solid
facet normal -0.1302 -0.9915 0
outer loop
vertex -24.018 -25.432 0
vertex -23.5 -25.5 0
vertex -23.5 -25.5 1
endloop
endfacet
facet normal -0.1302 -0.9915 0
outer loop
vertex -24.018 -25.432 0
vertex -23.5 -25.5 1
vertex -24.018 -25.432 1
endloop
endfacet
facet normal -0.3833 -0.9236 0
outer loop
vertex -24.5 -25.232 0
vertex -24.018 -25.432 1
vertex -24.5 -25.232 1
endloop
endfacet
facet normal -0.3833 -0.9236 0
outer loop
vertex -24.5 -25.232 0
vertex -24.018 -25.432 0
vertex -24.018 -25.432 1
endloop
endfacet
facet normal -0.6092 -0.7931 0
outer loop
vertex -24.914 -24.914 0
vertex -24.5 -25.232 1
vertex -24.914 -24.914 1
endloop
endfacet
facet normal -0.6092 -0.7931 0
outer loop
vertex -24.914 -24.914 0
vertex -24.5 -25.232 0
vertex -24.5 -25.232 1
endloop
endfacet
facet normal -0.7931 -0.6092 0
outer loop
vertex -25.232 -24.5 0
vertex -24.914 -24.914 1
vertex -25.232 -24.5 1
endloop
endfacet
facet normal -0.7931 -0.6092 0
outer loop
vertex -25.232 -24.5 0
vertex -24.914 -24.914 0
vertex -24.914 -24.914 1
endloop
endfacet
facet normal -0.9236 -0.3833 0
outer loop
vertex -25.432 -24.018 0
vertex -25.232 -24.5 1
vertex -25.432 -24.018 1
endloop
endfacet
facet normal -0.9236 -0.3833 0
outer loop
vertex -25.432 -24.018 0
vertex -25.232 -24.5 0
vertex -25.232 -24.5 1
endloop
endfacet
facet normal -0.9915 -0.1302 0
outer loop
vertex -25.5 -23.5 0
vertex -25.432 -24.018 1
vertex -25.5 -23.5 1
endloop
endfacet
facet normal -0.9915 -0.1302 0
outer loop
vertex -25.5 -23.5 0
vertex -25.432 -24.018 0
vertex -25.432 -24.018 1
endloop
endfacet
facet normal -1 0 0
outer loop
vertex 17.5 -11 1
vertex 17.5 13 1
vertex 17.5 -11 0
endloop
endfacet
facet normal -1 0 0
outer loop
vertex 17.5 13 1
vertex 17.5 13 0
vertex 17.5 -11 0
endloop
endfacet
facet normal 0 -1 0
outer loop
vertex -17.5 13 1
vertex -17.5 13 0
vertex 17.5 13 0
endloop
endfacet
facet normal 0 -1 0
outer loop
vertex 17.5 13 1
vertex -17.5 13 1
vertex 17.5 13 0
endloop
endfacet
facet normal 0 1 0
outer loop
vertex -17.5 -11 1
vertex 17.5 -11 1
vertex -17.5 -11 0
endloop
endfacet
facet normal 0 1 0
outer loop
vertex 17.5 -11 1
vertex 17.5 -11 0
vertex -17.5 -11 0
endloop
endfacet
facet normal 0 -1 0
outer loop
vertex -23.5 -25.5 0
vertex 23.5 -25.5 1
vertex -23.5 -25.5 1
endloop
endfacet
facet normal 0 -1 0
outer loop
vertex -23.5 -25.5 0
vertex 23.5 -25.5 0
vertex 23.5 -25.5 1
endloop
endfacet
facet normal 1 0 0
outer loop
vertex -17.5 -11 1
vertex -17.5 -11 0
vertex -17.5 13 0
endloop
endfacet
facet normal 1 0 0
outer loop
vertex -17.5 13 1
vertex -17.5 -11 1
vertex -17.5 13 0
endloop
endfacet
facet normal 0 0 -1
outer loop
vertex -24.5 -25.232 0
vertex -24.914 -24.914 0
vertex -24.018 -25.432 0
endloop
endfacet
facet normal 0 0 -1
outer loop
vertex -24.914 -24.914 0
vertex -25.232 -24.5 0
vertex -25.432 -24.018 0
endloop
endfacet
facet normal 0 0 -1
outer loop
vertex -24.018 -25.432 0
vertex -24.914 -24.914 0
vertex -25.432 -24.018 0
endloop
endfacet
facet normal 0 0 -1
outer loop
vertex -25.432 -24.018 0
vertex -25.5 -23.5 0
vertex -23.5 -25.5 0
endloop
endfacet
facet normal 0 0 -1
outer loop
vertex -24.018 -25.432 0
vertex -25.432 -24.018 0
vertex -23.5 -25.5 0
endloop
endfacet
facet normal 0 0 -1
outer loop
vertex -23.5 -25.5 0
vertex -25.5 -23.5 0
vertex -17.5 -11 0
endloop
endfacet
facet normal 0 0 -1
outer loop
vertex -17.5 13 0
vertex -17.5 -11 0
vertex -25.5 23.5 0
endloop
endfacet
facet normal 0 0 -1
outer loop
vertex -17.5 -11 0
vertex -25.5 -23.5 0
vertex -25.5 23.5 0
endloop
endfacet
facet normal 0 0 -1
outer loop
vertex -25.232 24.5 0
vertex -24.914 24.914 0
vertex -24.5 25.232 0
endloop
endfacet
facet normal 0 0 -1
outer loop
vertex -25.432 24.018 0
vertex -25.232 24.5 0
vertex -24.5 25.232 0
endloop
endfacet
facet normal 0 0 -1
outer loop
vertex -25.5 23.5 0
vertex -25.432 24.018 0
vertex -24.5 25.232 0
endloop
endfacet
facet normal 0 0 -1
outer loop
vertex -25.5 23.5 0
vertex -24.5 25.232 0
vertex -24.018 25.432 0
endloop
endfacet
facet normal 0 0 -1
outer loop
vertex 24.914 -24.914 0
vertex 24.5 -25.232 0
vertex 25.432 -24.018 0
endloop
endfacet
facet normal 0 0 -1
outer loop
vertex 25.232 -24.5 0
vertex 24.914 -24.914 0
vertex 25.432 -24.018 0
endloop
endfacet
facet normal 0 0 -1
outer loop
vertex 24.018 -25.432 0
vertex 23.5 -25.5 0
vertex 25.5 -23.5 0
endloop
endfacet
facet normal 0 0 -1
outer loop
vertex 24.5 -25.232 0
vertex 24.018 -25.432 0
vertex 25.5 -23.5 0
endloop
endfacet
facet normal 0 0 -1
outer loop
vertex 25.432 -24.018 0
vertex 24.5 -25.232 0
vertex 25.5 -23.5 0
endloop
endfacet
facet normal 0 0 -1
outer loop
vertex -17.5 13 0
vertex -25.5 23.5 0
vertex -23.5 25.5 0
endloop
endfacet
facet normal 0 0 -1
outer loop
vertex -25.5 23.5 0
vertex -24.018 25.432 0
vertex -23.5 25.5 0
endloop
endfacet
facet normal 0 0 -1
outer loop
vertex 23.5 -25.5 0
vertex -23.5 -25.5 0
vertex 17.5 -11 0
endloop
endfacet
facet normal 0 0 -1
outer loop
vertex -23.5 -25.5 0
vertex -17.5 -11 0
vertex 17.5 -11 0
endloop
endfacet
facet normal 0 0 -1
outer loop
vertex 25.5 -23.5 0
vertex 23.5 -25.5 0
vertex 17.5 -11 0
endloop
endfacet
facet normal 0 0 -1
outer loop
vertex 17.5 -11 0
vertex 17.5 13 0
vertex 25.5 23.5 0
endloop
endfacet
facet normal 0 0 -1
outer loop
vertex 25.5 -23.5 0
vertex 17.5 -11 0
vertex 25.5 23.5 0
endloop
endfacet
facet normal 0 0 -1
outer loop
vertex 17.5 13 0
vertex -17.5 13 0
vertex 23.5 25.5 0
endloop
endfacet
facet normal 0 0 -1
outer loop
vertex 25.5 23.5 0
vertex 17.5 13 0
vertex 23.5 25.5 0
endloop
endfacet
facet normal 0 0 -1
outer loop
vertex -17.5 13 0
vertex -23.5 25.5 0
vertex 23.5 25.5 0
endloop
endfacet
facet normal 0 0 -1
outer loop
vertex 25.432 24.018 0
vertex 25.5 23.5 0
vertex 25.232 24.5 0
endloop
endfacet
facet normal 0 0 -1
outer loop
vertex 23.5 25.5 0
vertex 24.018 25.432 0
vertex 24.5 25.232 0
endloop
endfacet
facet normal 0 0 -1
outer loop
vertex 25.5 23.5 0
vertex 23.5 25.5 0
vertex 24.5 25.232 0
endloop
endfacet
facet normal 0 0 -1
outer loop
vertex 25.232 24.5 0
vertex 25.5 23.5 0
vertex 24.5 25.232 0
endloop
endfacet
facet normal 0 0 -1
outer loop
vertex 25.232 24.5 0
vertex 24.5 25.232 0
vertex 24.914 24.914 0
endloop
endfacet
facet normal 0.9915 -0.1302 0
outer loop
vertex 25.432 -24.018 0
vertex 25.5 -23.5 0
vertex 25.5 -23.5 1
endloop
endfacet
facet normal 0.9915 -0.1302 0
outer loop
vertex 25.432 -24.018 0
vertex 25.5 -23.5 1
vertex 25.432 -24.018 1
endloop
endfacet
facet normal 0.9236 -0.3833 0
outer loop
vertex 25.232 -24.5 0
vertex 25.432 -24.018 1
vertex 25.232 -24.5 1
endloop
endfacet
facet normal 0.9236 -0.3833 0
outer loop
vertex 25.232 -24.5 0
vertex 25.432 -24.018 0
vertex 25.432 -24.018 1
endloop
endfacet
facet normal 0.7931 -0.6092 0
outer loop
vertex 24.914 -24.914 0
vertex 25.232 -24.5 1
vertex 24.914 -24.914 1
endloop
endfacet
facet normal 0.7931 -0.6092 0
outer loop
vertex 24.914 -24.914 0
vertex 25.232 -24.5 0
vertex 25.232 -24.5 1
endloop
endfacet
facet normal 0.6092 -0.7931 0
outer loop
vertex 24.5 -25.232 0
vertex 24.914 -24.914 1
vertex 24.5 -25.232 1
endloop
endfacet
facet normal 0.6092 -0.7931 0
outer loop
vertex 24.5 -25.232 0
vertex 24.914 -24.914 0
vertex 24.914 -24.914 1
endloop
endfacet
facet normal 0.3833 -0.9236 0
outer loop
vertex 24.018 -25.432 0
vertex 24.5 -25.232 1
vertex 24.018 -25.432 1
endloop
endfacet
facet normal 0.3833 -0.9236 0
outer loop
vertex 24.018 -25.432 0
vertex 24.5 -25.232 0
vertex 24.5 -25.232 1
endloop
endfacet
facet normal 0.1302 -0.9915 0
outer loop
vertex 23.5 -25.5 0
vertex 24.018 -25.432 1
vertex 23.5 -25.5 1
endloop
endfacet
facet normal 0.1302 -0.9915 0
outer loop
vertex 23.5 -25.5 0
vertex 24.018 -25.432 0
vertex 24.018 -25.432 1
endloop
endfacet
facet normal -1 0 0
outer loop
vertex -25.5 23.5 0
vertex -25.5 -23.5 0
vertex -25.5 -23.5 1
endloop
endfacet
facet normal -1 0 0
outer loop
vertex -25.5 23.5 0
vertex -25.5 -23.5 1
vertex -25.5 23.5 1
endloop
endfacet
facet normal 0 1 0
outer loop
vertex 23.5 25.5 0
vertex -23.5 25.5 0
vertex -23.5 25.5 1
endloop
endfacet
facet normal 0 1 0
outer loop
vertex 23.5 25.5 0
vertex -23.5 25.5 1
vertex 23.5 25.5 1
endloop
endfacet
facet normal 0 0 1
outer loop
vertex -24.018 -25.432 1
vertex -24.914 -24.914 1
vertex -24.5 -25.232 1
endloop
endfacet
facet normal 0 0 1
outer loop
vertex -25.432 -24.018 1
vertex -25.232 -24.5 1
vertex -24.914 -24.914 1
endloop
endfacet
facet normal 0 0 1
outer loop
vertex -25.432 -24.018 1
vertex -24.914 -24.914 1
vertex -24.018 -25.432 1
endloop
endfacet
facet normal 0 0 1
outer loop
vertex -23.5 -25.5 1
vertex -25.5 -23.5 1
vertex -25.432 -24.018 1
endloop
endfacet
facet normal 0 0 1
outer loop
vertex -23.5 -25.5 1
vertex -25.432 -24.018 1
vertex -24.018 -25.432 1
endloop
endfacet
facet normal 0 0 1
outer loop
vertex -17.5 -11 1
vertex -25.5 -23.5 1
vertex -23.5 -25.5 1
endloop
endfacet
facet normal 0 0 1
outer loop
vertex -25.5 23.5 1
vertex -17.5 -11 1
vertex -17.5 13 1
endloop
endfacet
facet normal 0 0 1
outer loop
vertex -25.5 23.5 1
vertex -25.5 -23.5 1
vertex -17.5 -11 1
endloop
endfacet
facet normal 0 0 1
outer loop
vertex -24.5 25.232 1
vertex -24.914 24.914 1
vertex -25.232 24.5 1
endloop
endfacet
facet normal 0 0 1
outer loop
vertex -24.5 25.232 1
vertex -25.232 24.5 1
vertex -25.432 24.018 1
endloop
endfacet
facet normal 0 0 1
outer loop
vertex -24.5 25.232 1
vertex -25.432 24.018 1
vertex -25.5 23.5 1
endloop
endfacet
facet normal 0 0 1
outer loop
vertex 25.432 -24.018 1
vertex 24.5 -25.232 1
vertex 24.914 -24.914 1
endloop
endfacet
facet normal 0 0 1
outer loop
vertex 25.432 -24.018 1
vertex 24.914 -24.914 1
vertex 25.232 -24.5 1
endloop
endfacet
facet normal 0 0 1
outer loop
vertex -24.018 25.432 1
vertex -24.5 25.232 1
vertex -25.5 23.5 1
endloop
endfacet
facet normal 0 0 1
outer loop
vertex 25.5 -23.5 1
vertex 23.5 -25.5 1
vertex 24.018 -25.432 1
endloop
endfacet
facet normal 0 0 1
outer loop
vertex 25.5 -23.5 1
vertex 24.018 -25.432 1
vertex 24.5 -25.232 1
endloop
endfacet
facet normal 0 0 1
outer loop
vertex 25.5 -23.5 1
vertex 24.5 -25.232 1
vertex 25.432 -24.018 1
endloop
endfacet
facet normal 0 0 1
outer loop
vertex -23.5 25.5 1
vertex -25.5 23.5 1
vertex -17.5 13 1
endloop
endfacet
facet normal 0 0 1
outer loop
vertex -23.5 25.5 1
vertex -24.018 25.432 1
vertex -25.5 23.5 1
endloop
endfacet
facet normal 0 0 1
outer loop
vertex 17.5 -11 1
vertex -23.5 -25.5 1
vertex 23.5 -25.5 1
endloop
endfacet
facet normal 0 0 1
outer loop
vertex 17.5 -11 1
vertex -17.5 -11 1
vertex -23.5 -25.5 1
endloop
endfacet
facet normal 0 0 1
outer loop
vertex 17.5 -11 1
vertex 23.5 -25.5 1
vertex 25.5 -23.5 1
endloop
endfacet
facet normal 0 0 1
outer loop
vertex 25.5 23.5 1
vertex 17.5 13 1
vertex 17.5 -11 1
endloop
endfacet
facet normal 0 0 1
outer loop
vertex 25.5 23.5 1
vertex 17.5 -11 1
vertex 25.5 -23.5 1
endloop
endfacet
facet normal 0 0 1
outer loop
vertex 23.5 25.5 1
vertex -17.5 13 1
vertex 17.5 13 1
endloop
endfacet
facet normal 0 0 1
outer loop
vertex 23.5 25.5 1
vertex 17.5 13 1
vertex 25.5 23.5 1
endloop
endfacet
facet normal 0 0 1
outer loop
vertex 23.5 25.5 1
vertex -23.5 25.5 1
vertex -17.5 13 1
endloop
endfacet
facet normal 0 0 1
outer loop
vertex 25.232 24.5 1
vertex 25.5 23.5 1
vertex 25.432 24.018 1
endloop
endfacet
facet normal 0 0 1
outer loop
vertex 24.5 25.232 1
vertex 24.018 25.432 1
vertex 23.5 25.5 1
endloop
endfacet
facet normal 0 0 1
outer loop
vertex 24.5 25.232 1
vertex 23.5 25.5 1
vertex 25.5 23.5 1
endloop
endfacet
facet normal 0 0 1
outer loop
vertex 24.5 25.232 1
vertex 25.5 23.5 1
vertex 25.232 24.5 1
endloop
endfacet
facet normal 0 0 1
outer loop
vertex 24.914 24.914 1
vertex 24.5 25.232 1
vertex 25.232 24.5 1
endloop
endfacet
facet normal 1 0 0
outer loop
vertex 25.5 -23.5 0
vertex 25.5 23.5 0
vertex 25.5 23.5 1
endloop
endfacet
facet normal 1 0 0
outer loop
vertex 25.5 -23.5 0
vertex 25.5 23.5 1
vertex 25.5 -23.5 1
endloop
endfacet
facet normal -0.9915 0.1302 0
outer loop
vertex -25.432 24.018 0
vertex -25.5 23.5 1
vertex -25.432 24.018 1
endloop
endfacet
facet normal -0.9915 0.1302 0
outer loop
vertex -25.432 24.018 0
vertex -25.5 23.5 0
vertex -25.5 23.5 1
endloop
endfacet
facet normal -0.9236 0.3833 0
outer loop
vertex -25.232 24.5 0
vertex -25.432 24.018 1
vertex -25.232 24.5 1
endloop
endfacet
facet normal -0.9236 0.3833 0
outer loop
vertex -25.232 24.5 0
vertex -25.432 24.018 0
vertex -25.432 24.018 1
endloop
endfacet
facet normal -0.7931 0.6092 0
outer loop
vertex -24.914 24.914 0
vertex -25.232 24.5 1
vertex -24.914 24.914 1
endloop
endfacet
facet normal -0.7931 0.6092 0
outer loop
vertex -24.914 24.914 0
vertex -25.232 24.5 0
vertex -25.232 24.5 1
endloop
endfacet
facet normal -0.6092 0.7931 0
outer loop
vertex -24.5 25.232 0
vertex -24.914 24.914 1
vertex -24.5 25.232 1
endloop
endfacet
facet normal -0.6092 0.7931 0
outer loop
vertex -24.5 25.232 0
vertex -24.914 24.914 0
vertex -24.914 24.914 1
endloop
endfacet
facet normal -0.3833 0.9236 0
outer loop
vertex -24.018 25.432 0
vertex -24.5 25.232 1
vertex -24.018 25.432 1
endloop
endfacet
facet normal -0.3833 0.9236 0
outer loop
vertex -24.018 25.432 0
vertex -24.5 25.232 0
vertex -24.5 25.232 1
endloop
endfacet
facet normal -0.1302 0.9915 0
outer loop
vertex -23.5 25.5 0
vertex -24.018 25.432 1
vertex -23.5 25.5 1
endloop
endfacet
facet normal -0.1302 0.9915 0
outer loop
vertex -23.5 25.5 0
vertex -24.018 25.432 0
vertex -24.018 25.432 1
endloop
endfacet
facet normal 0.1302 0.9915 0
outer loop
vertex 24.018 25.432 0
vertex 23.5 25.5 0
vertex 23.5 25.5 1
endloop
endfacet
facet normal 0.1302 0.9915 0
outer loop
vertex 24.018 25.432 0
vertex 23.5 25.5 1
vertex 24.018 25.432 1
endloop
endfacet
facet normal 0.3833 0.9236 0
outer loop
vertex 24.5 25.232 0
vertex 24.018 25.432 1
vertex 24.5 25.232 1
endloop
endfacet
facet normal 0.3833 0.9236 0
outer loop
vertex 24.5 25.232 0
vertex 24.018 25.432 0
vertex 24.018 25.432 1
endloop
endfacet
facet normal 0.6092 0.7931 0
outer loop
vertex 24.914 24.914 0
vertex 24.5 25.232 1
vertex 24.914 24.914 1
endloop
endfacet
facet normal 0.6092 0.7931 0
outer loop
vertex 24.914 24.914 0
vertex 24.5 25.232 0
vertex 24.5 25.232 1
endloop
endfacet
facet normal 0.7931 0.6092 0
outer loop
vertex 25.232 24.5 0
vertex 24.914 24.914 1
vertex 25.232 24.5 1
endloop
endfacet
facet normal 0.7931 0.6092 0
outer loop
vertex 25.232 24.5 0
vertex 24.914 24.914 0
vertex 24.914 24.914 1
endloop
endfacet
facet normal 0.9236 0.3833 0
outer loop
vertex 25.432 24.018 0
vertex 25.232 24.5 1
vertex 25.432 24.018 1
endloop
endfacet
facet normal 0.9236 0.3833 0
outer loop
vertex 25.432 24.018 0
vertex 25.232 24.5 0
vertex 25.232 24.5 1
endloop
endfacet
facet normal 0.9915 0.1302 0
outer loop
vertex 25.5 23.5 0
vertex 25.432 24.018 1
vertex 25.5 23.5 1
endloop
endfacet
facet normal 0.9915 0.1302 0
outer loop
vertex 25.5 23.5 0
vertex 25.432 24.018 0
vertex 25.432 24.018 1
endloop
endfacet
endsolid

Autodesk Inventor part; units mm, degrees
ref_plane "YZ Plane" through (0, 0, 0) normal (1, 0, 0) x (0, 1, 0)
ref_plane "XZ Plane" through (0, 0, 0) normal (0, 1, 0) x (-1, 0, 0)
ref_plane "XY Plane" through (0, 0, 0) normal (0, 0, 1) x (1, 0, 0)
sketch "Skizze1" plane through (0, 0, 0) normal (0, 0, 1) x (1, 0, 0)
  line L0 (23.5, -25.5) -> (-23.5, -25.5)
  line L1 (-25.5, -23.5) -> (-25.5, 23.5)
  line L2 (-23.5, 25.5) -> (23.5, 25.5)
  line L3 (25.5, 23.5) -> (25.5, -23.5)
  line L4 (25.5, -25.5) -> (-25.5, 25.5) construction
  line L5 (-25.5, -25.5) -> (25.5, 25.5) construction
  line L6 (-17.5, 13) -> (17.5, 13)
  line L7 (17.5, 13) -> (17.5, -11)
  line L8 (17.5, -11) -> (-17.5, -11)
  line L9 (-17.5, -11) -> (-17.5, 13)
  line L10 (-17.5, 13) -> (17.5, -11) construction
  line L11 (17.5, 13) -> (-17.5, -11) construction
  arc A0 (-23.5, 25.5) -> (-25.5, 23.5) centre (-23.5, 23.5) ccw
  arc A1 (25.5, 23.5) -> (23.5, 25.5) centre (23.5, 23.5) ccw
  arc A2 (23.5, -25.5) -> (25.5, -23.5) centre (23.5, -23.5) ccw
  arc A3 (-25.5, -23.5) -> (-23.5, -25.5) centre (-23.5, -23.5) ccw
  point P0 (0, 0)
  point P1 (0, 1)
  dimension "d0" = 51
  dimension "d1" = 51
  dimension "d2" = 35
  dimension "d3" = 24
  dimension "d4" = 12.5
  dimension "d5" = 2
extrude "Extrusion1" add sketch "Skizze1" along normal blind 1
ref_plane "Arbeitsebene1" through (0, -23.5, 0) normal (1, 0, 0) x (0, 0, -1)
properties part number "00_Grating_1000linesPerMM"
